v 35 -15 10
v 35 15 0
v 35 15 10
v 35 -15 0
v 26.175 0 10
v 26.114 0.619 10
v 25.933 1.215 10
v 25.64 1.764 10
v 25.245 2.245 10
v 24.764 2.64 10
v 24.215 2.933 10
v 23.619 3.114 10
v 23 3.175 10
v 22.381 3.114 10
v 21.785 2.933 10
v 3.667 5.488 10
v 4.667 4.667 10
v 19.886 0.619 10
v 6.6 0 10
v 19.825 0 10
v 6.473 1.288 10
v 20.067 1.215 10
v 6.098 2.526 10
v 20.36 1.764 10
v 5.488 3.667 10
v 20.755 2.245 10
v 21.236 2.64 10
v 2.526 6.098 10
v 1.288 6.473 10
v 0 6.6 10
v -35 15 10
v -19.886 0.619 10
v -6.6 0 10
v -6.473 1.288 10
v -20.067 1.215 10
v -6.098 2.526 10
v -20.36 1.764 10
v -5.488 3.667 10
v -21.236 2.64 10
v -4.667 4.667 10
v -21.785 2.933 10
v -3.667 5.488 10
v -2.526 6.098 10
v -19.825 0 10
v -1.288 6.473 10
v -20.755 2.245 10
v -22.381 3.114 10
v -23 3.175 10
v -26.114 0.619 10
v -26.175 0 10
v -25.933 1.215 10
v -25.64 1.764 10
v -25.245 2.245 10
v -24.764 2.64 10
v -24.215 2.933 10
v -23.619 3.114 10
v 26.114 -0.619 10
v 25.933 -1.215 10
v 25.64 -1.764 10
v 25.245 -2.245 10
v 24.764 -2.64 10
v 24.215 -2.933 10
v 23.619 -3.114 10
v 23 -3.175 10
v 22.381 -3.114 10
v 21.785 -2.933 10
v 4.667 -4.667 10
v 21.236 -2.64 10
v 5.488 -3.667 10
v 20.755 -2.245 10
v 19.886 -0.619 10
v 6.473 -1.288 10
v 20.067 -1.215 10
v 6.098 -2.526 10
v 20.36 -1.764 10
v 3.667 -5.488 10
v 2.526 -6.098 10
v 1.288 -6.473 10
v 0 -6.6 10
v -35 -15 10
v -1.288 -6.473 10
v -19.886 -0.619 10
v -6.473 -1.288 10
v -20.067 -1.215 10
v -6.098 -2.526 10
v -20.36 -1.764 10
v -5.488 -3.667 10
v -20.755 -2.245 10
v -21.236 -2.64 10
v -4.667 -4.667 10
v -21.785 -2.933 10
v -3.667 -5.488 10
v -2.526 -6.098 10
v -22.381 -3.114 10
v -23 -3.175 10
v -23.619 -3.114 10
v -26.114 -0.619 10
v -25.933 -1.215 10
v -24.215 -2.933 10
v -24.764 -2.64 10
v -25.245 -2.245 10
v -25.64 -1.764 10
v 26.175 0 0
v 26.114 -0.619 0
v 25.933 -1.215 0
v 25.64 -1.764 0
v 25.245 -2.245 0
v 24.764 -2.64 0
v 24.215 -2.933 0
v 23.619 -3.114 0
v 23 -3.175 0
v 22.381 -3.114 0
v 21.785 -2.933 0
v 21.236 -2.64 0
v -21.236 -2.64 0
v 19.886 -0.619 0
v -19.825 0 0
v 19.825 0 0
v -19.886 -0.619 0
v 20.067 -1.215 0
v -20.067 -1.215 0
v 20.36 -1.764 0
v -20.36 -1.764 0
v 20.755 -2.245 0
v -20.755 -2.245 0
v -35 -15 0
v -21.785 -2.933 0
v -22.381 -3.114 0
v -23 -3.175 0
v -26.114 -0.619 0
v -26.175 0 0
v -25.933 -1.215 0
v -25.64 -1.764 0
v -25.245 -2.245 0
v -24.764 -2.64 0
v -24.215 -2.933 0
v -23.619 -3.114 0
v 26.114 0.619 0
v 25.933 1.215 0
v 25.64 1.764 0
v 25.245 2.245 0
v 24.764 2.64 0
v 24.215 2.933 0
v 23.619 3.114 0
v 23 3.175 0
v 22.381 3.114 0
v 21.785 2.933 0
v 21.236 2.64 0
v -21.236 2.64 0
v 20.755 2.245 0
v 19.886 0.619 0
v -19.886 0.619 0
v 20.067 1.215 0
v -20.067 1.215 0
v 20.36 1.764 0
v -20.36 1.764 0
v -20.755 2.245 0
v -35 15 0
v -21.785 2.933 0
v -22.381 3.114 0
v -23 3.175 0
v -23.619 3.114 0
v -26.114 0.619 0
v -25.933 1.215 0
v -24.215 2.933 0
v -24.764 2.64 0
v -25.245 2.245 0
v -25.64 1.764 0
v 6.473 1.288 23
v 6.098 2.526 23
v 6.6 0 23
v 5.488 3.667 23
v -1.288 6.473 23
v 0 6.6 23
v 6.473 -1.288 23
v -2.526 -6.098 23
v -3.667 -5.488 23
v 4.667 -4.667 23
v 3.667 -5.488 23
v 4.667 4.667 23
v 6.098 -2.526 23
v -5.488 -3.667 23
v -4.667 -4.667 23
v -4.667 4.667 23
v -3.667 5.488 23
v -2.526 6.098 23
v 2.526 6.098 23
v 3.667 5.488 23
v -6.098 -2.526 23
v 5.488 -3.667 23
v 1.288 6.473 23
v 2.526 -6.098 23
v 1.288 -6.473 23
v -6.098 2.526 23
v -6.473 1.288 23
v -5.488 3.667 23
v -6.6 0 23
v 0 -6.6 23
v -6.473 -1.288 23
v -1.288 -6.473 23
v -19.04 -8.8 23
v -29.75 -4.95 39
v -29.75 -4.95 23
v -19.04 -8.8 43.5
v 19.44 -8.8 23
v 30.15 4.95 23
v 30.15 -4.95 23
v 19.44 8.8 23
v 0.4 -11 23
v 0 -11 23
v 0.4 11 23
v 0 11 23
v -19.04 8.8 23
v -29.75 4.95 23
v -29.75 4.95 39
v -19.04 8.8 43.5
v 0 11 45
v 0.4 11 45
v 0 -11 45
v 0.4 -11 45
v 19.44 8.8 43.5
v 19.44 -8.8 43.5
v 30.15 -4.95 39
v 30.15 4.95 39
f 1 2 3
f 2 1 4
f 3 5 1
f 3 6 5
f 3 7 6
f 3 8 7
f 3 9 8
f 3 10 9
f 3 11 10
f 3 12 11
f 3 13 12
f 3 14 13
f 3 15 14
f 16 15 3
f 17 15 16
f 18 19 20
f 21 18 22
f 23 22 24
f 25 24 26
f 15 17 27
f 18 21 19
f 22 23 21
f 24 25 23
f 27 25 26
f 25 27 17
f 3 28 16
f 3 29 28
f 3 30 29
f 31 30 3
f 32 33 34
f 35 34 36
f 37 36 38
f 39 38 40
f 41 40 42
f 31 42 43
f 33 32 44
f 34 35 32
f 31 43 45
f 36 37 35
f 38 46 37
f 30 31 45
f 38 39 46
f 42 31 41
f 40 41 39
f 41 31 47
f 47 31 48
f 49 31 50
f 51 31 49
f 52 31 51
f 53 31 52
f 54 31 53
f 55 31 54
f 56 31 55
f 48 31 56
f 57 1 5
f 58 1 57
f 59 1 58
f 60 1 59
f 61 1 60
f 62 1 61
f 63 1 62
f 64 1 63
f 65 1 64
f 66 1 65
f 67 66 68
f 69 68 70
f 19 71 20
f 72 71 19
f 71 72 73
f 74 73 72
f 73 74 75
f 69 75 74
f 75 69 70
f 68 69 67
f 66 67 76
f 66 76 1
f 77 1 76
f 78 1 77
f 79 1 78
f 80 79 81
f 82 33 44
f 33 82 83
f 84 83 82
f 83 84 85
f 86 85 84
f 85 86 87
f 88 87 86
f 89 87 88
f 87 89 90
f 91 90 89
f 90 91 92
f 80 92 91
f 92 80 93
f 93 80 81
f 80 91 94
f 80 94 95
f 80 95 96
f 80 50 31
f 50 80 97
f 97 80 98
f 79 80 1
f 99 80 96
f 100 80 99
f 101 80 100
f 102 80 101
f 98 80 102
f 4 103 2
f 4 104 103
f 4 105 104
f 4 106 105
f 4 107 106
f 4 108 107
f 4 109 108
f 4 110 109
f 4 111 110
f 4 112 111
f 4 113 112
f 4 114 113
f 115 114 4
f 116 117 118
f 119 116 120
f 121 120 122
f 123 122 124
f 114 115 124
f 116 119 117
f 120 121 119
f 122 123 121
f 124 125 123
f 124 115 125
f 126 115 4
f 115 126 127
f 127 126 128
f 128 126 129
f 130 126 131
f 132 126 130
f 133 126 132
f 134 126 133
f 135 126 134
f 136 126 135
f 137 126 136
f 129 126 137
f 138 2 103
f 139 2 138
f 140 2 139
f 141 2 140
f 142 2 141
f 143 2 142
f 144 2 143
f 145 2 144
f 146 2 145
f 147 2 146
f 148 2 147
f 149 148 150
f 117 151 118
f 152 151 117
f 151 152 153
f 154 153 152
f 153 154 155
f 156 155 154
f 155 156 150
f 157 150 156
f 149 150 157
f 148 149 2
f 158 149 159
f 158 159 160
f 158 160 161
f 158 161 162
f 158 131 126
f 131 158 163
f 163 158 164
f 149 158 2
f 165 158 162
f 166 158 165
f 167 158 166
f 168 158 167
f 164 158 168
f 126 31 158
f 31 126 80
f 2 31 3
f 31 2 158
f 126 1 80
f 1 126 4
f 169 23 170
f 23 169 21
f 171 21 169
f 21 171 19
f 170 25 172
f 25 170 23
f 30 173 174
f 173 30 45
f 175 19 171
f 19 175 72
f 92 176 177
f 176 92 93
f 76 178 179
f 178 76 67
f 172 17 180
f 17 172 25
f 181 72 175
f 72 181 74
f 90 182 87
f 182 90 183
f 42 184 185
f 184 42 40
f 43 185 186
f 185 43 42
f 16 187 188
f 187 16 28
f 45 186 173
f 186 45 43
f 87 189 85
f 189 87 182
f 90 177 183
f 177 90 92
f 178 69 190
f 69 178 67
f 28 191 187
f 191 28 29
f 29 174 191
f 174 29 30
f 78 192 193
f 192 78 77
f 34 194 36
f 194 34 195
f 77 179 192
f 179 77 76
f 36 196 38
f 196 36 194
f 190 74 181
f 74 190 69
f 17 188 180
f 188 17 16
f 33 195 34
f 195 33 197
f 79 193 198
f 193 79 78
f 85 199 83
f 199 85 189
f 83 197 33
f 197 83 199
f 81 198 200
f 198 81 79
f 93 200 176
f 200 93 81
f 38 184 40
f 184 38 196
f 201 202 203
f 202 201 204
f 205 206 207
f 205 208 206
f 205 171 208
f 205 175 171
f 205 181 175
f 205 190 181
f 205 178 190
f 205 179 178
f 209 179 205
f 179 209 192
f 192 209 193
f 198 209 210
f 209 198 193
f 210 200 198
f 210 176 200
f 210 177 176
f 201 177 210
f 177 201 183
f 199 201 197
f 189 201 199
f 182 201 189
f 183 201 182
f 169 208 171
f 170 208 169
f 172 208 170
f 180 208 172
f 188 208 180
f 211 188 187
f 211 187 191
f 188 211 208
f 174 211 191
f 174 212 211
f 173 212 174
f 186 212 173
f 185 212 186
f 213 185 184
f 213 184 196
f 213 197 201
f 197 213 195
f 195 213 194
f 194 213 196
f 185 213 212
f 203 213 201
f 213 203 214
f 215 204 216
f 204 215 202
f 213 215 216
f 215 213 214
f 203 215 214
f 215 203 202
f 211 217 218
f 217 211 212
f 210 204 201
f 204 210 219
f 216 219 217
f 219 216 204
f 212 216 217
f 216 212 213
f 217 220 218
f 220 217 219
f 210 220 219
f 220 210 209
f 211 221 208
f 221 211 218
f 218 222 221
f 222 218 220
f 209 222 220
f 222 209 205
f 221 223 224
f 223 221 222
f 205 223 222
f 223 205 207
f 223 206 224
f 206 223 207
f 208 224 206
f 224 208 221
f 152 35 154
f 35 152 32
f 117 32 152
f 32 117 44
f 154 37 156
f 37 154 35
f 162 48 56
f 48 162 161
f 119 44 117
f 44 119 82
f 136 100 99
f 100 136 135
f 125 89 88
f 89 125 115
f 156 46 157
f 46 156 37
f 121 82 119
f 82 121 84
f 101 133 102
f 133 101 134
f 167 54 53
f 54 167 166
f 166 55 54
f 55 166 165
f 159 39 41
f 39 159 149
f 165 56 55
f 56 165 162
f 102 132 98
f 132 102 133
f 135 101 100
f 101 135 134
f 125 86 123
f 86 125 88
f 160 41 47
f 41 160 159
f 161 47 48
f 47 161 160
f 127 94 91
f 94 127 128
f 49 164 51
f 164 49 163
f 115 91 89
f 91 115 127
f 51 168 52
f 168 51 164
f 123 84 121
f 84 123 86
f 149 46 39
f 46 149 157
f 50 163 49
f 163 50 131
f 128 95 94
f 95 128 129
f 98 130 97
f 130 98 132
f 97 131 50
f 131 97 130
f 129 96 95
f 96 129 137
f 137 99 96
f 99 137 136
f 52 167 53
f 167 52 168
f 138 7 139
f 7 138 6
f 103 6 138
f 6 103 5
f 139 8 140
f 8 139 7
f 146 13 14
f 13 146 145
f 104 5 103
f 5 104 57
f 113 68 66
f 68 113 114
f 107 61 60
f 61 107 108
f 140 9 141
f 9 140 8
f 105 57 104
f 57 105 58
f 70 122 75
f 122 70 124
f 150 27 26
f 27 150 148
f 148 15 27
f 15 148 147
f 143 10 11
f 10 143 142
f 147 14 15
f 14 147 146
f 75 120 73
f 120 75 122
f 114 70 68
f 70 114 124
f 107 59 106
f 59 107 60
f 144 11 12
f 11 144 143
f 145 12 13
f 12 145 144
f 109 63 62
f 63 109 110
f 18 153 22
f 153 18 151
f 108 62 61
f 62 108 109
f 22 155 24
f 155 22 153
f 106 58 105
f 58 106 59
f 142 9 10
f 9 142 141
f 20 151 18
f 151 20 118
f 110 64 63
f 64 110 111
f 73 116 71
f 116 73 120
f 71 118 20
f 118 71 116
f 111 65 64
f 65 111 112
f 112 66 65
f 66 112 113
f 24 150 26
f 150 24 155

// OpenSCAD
$fn = 32;

// ----------------------------------------------------------------------
// Boat cleat: 70 mm base, horn 34 mm up
// ----------------------------------------------------------------------

// --- parameters (mm) ---
base_l = 70;              // base length
base_w = 30;              // base width
base_t = 10;              // base thickness
horn_len = 59.5;          // horn length
horn_d = 22;              // horn diameter at the middle
horn_z = 34;              // horn axis height
end_drop = 6;             // how far the horn tips drop
post_d = 13.2;            // centre post diameter
holes_d = 6.35;           // fixing holes
hole_x = 23;              // fixing hole spacing

difference() {
  union() {
    translate([-35, -15, 0]) cube([base_l, base_w, base_t]);
    /* centre post, sunk 1 mm into the base */
    translate([0, 0, 9]) cylinder(h = 25, d = post_d);
    /* horn: a hull chain of boxes, full in the middle and lighter at the tips */
    hull() {
      translate([-29.75, -4.95, 23]) cube([0.4, 9.9, 16], center = false);
      translate([-19.04, -8.8, 23]) cube([0.4, 17.6, 20.5], center = false);
    }
    hull() {
      translate([-19.04, -8.8, 23]) cube([0.4, 17.6, 20.5], center = false);
      translate([0, -11, 23]) cube([0.4, 22, 22], center = false);
    }
    hull() {
      translate([0, -11, 23]) cube([0.4, 22, 22], center = false);
      translate([19.04, -8.8, 23]) cube([0.4, 17.6, 20.5], center = false);
    }
    hull() {
      translate([19.04, -8.8, 23]) cube([0.4, 17.6, 20.5], center = false);
      translate([29.75, -4.95, 23]) cube([0.4, 9.9, 16], center = false);
    }
  }
  translate([-23, 0, -2.5]) cylinder(h = base_t + 5, d = holes_d);
  translate([23, 0, -2.5]) cylinder(h = base_t + 5, d = holes_d);
}
